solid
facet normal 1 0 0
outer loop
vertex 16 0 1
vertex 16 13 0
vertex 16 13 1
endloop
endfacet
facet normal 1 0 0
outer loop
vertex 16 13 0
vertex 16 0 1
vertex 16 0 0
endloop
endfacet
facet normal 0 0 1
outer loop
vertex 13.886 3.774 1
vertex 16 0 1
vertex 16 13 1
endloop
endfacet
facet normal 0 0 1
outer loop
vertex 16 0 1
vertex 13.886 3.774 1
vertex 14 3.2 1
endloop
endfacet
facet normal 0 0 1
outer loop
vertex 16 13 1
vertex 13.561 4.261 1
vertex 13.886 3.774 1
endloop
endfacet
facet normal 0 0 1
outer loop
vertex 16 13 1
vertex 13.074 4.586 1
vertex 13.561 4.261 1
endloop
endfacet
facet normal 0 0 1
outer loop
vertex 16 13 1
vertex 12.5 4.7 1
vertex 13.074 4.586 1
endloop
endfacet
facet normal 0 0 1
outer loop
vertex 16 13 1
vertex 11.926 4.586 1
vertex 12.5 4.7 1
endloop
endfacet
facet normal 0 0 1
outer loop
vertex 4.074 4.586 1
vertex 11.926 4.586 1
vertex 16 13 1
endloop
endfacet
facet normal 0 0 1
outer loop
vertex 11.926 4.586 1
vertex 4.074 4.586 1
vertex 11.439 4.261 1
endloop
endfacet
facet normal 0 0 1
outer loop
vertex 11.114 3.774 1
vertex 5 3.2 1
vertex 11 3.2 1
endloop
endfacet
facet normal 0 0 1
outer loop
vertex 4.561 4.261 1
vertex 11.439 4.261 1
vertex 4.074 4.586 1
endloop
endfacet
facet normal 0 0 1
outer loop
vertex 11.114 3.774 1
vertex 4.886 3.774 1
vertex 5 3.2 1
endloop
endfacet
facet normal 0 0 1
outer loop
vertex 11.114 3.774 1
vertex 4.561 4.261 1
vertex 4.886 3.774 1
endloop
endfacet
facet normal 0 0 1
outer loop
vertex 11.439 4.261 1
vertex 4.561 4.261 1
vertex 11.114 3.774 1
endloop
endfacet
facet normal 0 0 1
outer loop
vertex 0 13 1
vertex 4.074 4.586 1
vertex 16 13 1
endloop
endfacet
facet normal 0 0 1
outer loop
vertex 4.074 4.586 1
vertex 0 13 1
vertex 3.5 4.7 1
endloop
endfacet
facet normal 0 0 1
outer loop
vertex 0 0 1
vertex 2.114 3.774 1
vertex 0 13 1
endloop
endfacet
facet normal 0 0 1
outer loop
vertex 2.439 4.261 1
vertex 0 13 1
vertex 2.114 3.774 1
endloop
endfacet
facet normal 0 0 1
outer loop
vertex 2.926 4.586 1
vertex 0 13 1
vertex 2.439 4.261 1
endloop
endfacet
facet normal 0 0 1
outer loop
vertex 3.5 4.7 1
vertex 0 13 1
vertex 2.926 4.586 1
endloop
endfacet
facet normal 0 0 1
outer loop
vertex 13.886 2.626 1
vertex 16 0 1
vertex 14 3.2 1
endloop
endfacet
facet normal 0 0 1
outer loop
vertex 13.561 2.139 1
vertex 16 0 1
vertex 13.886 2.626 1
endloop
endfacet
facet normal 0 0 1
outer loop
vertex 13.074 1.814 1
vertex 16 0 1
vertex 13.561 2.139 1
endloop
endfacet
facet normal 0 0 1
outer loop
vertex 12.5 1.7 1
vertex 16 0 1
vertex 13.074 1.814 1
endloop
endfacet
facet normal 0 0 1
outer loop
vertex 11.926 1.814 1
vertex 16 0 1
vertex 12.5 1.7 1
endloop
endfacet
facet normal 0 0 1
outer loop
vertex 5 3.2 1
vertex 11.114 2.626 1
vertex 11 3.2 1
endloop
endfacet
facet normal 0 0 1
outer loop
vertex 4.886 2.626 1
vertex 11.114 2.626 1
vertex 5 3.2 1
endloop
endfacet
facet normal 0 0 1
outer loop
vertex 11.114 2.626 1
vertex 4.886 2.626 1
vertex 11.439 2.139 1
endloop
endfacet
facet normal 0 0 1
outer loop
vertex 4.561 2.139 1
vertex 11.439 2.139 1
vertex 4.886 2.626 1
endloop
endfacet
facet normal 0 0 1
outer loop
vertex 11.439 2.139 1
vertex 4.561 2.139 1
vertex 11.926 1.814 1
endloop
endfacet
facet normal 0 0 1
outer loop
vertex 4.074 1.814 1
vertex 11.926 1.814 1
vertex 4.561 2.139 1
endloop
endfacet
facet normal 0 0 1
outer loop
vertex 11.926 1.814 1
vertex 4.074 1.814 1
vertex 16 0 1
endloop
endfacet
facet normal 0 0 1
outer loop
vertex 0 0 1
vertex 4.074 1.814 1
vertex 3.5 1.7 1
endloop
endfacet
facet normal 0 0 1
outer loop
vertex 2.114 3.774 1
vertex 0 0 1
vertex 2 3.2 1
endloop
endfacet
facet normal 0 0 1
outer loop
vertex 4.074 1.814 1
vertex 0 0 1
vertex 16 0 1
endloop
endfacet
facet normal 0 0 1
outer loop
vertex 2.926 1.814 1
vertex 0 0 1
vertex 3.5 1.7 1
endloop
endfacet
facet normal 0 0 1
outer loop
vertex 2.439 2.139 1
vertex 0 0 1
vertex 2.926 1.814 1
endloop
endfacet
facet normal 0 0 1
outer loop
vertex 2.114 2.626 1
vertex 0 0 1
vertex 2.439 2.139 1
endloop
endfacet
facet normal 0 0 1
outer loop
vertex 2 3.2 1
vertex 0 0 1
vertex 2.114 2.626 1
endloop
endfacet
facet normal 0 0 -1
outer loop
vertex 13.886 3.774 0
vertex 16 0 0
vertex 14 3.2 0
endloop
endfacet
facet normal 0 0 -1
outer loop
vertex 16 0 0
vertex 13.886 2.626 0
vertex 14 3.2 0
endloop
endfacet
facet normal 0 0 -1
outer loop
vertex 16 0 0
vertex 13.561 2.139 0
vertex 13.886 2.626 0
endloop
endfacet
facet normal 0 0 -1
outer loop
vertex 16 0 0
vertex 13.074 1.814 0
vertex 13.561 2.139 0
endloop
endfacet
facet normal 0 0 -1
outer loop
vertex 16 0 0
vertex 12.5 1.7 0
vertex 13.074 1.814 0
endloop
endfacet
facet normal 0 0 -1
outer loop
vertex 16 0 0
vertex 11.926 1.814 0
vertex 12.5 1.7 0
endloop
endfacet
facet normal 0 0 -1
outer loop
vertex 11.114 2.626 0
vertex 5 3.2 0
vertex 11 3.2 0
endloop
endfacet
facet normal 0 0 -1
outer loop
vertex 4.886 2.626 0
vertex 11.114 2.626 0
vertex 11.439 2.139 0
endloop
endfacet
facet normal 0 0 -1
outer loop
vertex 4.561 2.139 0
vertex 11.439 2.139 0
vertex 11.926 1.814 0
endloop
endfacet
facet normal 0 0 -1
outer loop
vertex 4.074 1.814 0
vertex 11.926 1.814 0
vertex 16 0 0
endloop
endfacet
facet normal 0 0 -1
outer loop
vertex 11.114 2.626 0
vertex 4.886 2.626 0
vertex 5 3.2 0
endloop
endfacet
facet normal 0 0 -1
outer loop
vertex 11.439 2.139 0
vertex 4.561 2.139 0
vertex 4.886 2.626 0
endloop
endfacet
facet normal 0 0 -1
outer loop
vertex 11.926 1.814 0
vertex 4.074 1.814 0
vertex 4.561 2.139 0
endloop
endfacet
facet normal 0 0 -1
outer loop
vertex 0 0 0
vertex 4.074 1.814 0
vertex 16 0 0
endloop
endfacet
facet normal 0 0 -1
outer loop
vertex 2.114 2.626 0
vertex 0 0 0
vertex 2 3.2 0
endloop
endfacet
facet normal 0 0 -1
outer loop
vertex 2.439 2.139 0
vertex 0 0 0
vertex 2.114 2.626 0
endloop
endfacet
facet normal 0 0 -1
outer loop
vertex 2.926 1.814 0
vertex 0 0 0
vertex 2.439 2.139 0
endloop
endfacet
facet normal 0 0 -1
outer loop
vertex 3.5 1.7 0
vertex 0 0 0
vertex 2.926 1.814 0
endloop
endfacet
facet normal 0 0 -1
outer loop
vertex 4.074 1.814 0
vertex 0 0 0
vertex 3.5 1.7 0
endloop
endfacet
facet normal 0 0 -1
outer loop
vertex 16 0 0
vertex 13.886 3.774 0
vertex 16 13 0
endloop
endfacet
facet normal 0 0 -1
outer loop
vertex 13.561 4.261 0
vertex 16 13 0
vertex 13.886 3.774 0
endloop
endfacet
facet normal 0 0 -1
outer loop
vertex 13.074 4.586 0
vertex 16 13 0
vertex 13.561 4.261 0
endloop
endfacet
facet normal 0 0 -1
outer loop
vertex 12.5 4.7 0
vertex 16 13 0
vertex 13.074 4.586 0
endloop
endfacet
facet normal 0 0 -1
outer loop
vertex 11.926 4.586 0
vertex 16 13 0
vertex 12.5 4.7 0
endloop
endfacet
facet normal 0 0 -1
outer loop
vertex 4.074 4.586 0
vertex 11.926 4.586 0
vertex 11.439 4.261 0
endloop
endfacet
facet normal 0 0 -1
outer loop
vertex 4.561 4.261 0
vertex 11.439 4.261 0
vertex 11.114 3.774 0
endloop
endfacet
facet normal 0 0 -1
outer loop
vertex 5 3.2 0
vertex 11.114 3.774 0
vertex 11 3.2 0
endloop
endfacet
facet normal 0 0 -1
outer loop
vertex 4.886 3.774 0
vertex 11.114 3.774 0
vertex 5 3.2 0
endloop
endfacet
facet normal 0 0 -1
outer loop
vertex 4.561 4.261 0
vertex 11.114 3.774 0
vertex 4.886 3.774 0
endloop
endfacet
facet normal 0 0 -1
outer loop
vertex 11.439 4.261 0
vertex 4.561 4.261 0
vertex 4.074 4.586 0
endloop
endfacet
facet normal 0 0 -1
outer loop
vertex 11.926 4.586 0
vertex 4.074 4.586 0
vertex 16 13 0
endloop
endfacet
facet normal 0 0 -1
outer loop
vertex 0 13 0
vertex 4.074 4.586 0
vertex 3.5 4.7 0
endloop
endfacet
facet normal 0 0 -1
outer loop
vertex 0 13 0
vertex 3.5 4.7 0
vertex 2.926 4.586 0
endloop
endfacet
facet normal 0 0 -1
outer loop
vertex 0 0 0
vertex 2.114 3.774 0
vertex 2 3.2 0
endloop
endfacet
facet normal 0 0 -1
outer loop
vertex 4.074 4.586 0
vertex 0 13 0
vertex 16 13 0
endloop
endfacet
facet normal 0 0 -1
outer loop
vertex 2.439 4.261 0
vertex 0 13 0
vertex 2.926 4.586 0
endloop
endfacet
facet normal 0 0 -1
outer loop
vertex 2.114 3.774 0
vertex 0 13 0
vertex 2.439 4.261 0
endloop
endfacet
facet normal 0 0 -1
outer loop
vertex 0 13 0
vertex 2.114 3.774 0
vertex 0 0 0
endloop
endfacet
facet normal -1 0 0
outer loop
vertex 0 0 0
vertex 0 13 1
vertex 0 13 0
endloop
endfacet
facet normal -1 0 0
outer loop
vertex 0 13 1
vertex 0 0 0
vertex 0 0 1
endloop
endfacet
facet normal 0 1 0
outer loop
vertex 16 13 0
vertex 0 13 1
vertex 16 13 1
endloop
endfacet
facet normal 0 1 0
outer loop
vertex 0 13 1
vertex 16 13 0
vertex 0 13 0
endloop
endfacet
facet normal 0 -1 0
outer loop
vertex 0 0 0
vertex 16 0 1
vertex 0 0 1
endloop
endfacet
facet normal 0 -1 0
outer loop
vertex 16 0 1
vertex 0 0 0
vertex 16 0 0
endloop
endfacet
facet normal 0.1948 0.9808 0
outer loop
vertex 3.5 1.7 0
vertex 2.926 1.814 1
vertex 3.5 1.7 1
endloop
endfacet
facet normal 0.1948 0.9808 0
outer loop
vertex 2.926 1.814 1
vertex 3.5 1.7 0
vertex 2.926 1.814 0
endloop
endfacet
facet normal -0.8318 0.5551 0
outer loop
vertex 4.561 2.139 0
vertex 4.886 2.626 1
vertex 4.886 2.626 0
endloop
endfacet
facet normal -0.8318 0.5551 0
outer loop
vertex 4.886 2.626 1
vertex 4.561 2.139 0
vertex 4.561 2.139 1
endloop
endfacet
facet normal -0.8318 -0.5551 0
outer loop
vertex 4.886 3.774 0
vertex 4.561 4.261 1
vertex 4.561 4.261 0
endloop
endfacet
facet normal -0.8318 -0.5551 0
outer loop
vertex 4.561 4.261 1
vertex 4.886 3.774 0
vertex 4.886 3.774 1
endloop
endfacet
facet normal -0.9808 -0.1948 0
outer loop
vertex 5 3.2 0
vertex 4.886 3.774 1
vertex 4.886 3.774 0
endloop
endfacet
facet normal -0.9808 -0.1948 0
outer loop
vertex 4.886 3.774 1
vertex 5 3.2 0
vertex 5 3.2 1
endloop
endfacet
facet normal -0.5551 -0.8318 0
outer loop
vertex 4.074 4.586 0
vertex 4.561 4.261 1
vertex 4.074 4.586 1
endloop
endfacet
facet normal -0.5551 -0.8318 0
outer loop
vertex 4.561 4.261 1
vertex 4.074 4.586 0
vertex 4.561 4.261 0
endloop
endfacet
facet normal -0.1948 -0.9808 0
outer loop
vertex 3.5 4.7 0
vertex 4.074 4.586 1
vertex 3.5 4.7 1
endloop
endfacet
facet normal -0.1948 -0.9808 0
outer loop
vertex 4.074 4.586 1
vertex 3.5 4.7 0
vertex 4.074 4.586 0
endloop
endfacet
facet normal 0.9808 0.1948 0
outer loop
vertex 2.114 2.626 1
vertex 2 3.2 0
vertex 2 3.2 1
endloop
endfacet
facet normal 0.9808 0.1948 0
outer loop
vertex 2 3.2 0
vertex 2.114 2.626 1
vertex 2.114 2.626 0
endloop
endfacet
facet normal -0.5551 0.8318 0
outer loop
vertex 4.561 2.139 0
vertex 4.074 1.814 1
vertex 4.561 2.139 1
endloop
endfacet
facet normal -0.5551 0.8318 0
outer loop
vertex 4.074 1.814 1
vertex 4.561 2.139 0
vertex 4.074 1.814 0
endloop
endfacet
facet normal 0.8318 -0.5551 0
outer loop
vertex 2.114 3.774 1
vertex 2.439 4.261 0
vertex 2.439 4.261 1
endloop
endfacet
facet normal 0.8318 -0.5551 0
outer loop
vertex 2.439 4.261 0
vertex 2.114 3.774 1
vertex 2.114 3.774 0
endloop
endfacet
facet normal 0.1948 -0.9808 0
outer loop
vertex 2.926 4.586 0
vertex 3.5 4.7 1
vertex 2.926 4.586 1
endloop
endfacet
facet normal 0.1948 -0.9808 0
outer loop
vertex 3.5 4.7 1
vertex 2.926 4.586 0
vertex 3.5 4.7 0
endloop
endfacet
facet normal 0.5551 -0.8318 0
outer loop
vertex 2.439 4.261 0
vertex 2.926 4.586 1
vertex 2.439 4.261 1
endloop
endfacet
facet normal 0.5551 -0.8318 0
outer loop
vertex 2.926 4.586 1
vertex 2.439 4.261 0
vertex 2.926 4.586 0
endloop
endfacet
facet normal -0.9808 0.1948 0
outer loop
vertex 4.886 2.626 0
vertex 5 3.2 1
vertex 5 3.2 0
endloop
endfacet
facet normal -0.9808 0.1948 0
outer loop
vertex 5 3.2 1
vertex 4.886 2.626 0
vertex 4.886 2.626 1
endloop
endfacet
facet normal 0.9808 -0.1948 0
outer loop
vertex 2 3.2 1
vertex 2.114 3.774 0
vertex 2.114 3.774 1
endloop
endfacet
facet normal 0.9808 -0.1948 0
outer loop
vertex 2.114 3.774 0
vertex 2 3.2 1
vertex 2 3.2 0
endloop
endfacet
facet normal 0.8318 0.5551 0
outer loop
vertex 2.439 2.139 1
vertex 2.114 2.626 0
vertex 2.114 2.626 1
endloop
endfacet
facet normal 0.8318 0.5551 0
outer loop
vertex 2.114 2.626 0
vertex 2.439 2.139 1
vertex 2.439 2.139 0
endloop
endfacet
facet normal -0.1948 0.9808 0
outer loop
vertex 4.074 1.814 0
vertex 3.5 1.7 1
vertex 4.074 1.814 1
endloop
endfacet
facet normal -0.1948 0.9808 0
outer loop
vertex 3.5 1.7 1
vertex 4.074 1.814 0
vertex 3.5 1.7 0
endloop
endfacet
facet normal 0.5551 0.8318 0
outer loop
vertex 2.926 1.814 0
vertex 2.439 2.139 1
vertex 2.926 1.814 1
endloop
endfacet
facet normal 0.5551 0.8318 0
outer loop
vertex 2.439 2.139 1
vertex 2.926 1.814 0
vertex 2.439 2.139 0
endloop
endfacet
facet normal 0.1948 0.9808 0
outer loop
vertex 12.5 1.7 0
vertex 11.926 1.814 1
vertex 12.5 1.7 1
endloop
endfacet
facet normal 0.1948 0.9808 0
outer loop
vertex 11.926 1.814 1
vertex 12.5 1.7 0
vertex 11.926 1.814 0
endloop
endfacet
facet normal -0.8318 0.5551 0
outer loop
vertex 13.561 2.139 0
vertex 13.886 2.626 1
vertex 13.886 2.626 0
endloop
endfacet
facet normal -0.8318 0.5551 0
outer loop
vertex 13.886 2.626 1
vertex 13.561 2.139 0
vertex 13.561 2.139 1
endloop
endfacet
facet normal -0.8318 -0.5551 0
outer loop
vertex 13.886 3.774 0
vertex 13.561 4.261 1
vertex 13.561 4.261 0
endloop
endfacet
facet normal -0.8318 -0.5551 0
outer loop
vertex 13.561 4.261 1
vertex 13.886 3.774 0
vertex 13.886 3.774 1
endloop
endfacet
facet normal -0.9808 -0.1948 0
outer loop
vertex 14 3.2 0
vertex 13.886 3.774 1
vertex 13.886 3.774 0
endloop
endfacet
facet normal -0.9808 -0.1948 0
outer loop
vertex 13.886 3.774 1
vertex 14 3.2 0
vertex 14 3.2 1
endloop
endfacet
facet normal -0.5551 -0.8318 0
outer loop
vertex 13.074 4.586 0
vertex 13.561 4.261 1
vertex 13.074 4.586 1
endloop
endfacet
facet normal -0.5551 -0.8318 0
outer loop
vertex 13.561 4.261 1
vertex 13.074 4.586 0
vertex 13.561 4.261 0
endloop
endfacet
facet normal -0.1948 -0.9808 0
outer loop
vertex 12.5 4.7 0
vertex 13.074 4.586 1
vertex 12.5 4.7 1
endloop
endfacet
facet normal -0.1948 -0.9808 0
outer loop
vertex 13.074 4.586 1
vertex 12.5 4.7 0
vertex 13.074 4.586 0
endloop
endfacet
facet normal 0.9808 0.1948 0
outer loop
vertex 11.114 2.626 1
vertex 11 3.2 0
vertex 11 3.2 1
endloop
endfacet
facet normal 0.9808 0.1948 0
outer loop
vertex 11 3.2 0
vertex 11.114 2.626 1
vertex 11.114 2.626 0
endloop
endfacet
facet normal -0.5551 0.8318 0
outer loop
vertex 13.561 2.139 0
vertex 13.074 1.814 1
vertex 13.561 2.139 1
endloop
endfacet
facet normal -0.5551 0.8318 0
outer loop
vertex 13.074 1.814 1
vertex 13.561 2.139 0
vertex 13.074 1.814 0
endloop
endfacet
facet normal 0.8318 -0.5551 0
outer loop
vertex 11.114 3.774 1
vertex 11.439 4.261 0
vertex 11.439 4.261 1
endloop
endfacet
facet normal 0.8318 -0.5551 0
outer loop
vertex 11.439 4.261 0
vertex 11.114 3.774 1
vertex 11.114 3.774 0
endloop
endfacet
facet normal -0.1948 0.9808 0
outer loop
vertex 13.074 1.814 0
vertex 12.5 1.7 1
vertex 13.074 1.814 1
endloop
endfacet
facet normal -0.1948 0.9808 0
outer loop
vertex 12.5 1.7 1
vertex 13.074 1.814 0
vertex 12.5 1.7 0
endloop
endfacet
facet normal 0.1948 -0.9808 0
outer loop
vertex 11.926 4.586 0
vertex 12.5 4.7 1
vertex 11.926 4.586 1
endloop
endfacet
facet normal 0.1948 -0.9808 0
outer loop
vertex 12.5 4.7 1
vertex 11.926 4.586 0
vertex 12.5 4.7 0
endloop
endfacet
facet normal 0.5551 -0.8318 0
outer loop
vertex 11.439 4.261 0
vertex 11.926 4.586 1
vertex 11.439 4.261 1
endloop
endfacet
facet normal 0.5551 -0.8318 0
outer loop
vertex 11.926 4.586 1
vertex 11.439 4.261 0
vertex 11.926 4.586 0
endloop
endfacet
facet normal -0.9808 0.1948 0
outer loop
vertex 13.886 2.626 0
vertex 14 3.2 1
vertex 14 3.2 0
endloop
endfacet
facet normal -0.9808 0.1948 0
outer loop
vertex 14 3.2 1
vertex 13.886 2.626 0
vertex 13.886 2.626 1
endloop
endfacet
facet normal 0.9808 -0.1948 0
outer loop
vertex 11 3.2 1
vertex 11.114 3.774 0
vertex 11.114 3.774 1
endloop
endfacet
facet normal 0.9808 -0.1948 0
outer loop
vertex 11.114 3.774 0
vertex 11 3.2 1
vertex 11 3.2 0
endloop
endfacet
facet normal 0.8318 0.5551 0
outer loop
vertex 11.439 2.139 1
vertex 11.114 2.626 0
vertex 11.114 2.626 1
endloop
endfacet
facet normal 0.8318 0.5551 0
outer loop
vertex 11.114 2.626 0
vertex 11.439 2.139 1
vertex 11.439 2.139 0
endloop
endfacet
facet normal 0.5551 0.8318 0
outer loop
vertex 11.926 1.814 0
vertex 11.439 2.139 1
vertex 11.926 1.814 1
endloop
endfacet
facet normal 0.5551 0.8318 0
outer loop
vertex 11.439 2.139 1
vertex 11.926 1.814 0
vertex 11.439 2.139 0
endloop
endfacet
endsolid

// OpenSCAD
$fn=16;

difference() {
cube([16, 13, 1]);

translate([3.5, 3.2, -1]) cylinder(d=3, h=3);

translate([12.5, 3.2, -1]) cylinder(d=3, h=3);
}
